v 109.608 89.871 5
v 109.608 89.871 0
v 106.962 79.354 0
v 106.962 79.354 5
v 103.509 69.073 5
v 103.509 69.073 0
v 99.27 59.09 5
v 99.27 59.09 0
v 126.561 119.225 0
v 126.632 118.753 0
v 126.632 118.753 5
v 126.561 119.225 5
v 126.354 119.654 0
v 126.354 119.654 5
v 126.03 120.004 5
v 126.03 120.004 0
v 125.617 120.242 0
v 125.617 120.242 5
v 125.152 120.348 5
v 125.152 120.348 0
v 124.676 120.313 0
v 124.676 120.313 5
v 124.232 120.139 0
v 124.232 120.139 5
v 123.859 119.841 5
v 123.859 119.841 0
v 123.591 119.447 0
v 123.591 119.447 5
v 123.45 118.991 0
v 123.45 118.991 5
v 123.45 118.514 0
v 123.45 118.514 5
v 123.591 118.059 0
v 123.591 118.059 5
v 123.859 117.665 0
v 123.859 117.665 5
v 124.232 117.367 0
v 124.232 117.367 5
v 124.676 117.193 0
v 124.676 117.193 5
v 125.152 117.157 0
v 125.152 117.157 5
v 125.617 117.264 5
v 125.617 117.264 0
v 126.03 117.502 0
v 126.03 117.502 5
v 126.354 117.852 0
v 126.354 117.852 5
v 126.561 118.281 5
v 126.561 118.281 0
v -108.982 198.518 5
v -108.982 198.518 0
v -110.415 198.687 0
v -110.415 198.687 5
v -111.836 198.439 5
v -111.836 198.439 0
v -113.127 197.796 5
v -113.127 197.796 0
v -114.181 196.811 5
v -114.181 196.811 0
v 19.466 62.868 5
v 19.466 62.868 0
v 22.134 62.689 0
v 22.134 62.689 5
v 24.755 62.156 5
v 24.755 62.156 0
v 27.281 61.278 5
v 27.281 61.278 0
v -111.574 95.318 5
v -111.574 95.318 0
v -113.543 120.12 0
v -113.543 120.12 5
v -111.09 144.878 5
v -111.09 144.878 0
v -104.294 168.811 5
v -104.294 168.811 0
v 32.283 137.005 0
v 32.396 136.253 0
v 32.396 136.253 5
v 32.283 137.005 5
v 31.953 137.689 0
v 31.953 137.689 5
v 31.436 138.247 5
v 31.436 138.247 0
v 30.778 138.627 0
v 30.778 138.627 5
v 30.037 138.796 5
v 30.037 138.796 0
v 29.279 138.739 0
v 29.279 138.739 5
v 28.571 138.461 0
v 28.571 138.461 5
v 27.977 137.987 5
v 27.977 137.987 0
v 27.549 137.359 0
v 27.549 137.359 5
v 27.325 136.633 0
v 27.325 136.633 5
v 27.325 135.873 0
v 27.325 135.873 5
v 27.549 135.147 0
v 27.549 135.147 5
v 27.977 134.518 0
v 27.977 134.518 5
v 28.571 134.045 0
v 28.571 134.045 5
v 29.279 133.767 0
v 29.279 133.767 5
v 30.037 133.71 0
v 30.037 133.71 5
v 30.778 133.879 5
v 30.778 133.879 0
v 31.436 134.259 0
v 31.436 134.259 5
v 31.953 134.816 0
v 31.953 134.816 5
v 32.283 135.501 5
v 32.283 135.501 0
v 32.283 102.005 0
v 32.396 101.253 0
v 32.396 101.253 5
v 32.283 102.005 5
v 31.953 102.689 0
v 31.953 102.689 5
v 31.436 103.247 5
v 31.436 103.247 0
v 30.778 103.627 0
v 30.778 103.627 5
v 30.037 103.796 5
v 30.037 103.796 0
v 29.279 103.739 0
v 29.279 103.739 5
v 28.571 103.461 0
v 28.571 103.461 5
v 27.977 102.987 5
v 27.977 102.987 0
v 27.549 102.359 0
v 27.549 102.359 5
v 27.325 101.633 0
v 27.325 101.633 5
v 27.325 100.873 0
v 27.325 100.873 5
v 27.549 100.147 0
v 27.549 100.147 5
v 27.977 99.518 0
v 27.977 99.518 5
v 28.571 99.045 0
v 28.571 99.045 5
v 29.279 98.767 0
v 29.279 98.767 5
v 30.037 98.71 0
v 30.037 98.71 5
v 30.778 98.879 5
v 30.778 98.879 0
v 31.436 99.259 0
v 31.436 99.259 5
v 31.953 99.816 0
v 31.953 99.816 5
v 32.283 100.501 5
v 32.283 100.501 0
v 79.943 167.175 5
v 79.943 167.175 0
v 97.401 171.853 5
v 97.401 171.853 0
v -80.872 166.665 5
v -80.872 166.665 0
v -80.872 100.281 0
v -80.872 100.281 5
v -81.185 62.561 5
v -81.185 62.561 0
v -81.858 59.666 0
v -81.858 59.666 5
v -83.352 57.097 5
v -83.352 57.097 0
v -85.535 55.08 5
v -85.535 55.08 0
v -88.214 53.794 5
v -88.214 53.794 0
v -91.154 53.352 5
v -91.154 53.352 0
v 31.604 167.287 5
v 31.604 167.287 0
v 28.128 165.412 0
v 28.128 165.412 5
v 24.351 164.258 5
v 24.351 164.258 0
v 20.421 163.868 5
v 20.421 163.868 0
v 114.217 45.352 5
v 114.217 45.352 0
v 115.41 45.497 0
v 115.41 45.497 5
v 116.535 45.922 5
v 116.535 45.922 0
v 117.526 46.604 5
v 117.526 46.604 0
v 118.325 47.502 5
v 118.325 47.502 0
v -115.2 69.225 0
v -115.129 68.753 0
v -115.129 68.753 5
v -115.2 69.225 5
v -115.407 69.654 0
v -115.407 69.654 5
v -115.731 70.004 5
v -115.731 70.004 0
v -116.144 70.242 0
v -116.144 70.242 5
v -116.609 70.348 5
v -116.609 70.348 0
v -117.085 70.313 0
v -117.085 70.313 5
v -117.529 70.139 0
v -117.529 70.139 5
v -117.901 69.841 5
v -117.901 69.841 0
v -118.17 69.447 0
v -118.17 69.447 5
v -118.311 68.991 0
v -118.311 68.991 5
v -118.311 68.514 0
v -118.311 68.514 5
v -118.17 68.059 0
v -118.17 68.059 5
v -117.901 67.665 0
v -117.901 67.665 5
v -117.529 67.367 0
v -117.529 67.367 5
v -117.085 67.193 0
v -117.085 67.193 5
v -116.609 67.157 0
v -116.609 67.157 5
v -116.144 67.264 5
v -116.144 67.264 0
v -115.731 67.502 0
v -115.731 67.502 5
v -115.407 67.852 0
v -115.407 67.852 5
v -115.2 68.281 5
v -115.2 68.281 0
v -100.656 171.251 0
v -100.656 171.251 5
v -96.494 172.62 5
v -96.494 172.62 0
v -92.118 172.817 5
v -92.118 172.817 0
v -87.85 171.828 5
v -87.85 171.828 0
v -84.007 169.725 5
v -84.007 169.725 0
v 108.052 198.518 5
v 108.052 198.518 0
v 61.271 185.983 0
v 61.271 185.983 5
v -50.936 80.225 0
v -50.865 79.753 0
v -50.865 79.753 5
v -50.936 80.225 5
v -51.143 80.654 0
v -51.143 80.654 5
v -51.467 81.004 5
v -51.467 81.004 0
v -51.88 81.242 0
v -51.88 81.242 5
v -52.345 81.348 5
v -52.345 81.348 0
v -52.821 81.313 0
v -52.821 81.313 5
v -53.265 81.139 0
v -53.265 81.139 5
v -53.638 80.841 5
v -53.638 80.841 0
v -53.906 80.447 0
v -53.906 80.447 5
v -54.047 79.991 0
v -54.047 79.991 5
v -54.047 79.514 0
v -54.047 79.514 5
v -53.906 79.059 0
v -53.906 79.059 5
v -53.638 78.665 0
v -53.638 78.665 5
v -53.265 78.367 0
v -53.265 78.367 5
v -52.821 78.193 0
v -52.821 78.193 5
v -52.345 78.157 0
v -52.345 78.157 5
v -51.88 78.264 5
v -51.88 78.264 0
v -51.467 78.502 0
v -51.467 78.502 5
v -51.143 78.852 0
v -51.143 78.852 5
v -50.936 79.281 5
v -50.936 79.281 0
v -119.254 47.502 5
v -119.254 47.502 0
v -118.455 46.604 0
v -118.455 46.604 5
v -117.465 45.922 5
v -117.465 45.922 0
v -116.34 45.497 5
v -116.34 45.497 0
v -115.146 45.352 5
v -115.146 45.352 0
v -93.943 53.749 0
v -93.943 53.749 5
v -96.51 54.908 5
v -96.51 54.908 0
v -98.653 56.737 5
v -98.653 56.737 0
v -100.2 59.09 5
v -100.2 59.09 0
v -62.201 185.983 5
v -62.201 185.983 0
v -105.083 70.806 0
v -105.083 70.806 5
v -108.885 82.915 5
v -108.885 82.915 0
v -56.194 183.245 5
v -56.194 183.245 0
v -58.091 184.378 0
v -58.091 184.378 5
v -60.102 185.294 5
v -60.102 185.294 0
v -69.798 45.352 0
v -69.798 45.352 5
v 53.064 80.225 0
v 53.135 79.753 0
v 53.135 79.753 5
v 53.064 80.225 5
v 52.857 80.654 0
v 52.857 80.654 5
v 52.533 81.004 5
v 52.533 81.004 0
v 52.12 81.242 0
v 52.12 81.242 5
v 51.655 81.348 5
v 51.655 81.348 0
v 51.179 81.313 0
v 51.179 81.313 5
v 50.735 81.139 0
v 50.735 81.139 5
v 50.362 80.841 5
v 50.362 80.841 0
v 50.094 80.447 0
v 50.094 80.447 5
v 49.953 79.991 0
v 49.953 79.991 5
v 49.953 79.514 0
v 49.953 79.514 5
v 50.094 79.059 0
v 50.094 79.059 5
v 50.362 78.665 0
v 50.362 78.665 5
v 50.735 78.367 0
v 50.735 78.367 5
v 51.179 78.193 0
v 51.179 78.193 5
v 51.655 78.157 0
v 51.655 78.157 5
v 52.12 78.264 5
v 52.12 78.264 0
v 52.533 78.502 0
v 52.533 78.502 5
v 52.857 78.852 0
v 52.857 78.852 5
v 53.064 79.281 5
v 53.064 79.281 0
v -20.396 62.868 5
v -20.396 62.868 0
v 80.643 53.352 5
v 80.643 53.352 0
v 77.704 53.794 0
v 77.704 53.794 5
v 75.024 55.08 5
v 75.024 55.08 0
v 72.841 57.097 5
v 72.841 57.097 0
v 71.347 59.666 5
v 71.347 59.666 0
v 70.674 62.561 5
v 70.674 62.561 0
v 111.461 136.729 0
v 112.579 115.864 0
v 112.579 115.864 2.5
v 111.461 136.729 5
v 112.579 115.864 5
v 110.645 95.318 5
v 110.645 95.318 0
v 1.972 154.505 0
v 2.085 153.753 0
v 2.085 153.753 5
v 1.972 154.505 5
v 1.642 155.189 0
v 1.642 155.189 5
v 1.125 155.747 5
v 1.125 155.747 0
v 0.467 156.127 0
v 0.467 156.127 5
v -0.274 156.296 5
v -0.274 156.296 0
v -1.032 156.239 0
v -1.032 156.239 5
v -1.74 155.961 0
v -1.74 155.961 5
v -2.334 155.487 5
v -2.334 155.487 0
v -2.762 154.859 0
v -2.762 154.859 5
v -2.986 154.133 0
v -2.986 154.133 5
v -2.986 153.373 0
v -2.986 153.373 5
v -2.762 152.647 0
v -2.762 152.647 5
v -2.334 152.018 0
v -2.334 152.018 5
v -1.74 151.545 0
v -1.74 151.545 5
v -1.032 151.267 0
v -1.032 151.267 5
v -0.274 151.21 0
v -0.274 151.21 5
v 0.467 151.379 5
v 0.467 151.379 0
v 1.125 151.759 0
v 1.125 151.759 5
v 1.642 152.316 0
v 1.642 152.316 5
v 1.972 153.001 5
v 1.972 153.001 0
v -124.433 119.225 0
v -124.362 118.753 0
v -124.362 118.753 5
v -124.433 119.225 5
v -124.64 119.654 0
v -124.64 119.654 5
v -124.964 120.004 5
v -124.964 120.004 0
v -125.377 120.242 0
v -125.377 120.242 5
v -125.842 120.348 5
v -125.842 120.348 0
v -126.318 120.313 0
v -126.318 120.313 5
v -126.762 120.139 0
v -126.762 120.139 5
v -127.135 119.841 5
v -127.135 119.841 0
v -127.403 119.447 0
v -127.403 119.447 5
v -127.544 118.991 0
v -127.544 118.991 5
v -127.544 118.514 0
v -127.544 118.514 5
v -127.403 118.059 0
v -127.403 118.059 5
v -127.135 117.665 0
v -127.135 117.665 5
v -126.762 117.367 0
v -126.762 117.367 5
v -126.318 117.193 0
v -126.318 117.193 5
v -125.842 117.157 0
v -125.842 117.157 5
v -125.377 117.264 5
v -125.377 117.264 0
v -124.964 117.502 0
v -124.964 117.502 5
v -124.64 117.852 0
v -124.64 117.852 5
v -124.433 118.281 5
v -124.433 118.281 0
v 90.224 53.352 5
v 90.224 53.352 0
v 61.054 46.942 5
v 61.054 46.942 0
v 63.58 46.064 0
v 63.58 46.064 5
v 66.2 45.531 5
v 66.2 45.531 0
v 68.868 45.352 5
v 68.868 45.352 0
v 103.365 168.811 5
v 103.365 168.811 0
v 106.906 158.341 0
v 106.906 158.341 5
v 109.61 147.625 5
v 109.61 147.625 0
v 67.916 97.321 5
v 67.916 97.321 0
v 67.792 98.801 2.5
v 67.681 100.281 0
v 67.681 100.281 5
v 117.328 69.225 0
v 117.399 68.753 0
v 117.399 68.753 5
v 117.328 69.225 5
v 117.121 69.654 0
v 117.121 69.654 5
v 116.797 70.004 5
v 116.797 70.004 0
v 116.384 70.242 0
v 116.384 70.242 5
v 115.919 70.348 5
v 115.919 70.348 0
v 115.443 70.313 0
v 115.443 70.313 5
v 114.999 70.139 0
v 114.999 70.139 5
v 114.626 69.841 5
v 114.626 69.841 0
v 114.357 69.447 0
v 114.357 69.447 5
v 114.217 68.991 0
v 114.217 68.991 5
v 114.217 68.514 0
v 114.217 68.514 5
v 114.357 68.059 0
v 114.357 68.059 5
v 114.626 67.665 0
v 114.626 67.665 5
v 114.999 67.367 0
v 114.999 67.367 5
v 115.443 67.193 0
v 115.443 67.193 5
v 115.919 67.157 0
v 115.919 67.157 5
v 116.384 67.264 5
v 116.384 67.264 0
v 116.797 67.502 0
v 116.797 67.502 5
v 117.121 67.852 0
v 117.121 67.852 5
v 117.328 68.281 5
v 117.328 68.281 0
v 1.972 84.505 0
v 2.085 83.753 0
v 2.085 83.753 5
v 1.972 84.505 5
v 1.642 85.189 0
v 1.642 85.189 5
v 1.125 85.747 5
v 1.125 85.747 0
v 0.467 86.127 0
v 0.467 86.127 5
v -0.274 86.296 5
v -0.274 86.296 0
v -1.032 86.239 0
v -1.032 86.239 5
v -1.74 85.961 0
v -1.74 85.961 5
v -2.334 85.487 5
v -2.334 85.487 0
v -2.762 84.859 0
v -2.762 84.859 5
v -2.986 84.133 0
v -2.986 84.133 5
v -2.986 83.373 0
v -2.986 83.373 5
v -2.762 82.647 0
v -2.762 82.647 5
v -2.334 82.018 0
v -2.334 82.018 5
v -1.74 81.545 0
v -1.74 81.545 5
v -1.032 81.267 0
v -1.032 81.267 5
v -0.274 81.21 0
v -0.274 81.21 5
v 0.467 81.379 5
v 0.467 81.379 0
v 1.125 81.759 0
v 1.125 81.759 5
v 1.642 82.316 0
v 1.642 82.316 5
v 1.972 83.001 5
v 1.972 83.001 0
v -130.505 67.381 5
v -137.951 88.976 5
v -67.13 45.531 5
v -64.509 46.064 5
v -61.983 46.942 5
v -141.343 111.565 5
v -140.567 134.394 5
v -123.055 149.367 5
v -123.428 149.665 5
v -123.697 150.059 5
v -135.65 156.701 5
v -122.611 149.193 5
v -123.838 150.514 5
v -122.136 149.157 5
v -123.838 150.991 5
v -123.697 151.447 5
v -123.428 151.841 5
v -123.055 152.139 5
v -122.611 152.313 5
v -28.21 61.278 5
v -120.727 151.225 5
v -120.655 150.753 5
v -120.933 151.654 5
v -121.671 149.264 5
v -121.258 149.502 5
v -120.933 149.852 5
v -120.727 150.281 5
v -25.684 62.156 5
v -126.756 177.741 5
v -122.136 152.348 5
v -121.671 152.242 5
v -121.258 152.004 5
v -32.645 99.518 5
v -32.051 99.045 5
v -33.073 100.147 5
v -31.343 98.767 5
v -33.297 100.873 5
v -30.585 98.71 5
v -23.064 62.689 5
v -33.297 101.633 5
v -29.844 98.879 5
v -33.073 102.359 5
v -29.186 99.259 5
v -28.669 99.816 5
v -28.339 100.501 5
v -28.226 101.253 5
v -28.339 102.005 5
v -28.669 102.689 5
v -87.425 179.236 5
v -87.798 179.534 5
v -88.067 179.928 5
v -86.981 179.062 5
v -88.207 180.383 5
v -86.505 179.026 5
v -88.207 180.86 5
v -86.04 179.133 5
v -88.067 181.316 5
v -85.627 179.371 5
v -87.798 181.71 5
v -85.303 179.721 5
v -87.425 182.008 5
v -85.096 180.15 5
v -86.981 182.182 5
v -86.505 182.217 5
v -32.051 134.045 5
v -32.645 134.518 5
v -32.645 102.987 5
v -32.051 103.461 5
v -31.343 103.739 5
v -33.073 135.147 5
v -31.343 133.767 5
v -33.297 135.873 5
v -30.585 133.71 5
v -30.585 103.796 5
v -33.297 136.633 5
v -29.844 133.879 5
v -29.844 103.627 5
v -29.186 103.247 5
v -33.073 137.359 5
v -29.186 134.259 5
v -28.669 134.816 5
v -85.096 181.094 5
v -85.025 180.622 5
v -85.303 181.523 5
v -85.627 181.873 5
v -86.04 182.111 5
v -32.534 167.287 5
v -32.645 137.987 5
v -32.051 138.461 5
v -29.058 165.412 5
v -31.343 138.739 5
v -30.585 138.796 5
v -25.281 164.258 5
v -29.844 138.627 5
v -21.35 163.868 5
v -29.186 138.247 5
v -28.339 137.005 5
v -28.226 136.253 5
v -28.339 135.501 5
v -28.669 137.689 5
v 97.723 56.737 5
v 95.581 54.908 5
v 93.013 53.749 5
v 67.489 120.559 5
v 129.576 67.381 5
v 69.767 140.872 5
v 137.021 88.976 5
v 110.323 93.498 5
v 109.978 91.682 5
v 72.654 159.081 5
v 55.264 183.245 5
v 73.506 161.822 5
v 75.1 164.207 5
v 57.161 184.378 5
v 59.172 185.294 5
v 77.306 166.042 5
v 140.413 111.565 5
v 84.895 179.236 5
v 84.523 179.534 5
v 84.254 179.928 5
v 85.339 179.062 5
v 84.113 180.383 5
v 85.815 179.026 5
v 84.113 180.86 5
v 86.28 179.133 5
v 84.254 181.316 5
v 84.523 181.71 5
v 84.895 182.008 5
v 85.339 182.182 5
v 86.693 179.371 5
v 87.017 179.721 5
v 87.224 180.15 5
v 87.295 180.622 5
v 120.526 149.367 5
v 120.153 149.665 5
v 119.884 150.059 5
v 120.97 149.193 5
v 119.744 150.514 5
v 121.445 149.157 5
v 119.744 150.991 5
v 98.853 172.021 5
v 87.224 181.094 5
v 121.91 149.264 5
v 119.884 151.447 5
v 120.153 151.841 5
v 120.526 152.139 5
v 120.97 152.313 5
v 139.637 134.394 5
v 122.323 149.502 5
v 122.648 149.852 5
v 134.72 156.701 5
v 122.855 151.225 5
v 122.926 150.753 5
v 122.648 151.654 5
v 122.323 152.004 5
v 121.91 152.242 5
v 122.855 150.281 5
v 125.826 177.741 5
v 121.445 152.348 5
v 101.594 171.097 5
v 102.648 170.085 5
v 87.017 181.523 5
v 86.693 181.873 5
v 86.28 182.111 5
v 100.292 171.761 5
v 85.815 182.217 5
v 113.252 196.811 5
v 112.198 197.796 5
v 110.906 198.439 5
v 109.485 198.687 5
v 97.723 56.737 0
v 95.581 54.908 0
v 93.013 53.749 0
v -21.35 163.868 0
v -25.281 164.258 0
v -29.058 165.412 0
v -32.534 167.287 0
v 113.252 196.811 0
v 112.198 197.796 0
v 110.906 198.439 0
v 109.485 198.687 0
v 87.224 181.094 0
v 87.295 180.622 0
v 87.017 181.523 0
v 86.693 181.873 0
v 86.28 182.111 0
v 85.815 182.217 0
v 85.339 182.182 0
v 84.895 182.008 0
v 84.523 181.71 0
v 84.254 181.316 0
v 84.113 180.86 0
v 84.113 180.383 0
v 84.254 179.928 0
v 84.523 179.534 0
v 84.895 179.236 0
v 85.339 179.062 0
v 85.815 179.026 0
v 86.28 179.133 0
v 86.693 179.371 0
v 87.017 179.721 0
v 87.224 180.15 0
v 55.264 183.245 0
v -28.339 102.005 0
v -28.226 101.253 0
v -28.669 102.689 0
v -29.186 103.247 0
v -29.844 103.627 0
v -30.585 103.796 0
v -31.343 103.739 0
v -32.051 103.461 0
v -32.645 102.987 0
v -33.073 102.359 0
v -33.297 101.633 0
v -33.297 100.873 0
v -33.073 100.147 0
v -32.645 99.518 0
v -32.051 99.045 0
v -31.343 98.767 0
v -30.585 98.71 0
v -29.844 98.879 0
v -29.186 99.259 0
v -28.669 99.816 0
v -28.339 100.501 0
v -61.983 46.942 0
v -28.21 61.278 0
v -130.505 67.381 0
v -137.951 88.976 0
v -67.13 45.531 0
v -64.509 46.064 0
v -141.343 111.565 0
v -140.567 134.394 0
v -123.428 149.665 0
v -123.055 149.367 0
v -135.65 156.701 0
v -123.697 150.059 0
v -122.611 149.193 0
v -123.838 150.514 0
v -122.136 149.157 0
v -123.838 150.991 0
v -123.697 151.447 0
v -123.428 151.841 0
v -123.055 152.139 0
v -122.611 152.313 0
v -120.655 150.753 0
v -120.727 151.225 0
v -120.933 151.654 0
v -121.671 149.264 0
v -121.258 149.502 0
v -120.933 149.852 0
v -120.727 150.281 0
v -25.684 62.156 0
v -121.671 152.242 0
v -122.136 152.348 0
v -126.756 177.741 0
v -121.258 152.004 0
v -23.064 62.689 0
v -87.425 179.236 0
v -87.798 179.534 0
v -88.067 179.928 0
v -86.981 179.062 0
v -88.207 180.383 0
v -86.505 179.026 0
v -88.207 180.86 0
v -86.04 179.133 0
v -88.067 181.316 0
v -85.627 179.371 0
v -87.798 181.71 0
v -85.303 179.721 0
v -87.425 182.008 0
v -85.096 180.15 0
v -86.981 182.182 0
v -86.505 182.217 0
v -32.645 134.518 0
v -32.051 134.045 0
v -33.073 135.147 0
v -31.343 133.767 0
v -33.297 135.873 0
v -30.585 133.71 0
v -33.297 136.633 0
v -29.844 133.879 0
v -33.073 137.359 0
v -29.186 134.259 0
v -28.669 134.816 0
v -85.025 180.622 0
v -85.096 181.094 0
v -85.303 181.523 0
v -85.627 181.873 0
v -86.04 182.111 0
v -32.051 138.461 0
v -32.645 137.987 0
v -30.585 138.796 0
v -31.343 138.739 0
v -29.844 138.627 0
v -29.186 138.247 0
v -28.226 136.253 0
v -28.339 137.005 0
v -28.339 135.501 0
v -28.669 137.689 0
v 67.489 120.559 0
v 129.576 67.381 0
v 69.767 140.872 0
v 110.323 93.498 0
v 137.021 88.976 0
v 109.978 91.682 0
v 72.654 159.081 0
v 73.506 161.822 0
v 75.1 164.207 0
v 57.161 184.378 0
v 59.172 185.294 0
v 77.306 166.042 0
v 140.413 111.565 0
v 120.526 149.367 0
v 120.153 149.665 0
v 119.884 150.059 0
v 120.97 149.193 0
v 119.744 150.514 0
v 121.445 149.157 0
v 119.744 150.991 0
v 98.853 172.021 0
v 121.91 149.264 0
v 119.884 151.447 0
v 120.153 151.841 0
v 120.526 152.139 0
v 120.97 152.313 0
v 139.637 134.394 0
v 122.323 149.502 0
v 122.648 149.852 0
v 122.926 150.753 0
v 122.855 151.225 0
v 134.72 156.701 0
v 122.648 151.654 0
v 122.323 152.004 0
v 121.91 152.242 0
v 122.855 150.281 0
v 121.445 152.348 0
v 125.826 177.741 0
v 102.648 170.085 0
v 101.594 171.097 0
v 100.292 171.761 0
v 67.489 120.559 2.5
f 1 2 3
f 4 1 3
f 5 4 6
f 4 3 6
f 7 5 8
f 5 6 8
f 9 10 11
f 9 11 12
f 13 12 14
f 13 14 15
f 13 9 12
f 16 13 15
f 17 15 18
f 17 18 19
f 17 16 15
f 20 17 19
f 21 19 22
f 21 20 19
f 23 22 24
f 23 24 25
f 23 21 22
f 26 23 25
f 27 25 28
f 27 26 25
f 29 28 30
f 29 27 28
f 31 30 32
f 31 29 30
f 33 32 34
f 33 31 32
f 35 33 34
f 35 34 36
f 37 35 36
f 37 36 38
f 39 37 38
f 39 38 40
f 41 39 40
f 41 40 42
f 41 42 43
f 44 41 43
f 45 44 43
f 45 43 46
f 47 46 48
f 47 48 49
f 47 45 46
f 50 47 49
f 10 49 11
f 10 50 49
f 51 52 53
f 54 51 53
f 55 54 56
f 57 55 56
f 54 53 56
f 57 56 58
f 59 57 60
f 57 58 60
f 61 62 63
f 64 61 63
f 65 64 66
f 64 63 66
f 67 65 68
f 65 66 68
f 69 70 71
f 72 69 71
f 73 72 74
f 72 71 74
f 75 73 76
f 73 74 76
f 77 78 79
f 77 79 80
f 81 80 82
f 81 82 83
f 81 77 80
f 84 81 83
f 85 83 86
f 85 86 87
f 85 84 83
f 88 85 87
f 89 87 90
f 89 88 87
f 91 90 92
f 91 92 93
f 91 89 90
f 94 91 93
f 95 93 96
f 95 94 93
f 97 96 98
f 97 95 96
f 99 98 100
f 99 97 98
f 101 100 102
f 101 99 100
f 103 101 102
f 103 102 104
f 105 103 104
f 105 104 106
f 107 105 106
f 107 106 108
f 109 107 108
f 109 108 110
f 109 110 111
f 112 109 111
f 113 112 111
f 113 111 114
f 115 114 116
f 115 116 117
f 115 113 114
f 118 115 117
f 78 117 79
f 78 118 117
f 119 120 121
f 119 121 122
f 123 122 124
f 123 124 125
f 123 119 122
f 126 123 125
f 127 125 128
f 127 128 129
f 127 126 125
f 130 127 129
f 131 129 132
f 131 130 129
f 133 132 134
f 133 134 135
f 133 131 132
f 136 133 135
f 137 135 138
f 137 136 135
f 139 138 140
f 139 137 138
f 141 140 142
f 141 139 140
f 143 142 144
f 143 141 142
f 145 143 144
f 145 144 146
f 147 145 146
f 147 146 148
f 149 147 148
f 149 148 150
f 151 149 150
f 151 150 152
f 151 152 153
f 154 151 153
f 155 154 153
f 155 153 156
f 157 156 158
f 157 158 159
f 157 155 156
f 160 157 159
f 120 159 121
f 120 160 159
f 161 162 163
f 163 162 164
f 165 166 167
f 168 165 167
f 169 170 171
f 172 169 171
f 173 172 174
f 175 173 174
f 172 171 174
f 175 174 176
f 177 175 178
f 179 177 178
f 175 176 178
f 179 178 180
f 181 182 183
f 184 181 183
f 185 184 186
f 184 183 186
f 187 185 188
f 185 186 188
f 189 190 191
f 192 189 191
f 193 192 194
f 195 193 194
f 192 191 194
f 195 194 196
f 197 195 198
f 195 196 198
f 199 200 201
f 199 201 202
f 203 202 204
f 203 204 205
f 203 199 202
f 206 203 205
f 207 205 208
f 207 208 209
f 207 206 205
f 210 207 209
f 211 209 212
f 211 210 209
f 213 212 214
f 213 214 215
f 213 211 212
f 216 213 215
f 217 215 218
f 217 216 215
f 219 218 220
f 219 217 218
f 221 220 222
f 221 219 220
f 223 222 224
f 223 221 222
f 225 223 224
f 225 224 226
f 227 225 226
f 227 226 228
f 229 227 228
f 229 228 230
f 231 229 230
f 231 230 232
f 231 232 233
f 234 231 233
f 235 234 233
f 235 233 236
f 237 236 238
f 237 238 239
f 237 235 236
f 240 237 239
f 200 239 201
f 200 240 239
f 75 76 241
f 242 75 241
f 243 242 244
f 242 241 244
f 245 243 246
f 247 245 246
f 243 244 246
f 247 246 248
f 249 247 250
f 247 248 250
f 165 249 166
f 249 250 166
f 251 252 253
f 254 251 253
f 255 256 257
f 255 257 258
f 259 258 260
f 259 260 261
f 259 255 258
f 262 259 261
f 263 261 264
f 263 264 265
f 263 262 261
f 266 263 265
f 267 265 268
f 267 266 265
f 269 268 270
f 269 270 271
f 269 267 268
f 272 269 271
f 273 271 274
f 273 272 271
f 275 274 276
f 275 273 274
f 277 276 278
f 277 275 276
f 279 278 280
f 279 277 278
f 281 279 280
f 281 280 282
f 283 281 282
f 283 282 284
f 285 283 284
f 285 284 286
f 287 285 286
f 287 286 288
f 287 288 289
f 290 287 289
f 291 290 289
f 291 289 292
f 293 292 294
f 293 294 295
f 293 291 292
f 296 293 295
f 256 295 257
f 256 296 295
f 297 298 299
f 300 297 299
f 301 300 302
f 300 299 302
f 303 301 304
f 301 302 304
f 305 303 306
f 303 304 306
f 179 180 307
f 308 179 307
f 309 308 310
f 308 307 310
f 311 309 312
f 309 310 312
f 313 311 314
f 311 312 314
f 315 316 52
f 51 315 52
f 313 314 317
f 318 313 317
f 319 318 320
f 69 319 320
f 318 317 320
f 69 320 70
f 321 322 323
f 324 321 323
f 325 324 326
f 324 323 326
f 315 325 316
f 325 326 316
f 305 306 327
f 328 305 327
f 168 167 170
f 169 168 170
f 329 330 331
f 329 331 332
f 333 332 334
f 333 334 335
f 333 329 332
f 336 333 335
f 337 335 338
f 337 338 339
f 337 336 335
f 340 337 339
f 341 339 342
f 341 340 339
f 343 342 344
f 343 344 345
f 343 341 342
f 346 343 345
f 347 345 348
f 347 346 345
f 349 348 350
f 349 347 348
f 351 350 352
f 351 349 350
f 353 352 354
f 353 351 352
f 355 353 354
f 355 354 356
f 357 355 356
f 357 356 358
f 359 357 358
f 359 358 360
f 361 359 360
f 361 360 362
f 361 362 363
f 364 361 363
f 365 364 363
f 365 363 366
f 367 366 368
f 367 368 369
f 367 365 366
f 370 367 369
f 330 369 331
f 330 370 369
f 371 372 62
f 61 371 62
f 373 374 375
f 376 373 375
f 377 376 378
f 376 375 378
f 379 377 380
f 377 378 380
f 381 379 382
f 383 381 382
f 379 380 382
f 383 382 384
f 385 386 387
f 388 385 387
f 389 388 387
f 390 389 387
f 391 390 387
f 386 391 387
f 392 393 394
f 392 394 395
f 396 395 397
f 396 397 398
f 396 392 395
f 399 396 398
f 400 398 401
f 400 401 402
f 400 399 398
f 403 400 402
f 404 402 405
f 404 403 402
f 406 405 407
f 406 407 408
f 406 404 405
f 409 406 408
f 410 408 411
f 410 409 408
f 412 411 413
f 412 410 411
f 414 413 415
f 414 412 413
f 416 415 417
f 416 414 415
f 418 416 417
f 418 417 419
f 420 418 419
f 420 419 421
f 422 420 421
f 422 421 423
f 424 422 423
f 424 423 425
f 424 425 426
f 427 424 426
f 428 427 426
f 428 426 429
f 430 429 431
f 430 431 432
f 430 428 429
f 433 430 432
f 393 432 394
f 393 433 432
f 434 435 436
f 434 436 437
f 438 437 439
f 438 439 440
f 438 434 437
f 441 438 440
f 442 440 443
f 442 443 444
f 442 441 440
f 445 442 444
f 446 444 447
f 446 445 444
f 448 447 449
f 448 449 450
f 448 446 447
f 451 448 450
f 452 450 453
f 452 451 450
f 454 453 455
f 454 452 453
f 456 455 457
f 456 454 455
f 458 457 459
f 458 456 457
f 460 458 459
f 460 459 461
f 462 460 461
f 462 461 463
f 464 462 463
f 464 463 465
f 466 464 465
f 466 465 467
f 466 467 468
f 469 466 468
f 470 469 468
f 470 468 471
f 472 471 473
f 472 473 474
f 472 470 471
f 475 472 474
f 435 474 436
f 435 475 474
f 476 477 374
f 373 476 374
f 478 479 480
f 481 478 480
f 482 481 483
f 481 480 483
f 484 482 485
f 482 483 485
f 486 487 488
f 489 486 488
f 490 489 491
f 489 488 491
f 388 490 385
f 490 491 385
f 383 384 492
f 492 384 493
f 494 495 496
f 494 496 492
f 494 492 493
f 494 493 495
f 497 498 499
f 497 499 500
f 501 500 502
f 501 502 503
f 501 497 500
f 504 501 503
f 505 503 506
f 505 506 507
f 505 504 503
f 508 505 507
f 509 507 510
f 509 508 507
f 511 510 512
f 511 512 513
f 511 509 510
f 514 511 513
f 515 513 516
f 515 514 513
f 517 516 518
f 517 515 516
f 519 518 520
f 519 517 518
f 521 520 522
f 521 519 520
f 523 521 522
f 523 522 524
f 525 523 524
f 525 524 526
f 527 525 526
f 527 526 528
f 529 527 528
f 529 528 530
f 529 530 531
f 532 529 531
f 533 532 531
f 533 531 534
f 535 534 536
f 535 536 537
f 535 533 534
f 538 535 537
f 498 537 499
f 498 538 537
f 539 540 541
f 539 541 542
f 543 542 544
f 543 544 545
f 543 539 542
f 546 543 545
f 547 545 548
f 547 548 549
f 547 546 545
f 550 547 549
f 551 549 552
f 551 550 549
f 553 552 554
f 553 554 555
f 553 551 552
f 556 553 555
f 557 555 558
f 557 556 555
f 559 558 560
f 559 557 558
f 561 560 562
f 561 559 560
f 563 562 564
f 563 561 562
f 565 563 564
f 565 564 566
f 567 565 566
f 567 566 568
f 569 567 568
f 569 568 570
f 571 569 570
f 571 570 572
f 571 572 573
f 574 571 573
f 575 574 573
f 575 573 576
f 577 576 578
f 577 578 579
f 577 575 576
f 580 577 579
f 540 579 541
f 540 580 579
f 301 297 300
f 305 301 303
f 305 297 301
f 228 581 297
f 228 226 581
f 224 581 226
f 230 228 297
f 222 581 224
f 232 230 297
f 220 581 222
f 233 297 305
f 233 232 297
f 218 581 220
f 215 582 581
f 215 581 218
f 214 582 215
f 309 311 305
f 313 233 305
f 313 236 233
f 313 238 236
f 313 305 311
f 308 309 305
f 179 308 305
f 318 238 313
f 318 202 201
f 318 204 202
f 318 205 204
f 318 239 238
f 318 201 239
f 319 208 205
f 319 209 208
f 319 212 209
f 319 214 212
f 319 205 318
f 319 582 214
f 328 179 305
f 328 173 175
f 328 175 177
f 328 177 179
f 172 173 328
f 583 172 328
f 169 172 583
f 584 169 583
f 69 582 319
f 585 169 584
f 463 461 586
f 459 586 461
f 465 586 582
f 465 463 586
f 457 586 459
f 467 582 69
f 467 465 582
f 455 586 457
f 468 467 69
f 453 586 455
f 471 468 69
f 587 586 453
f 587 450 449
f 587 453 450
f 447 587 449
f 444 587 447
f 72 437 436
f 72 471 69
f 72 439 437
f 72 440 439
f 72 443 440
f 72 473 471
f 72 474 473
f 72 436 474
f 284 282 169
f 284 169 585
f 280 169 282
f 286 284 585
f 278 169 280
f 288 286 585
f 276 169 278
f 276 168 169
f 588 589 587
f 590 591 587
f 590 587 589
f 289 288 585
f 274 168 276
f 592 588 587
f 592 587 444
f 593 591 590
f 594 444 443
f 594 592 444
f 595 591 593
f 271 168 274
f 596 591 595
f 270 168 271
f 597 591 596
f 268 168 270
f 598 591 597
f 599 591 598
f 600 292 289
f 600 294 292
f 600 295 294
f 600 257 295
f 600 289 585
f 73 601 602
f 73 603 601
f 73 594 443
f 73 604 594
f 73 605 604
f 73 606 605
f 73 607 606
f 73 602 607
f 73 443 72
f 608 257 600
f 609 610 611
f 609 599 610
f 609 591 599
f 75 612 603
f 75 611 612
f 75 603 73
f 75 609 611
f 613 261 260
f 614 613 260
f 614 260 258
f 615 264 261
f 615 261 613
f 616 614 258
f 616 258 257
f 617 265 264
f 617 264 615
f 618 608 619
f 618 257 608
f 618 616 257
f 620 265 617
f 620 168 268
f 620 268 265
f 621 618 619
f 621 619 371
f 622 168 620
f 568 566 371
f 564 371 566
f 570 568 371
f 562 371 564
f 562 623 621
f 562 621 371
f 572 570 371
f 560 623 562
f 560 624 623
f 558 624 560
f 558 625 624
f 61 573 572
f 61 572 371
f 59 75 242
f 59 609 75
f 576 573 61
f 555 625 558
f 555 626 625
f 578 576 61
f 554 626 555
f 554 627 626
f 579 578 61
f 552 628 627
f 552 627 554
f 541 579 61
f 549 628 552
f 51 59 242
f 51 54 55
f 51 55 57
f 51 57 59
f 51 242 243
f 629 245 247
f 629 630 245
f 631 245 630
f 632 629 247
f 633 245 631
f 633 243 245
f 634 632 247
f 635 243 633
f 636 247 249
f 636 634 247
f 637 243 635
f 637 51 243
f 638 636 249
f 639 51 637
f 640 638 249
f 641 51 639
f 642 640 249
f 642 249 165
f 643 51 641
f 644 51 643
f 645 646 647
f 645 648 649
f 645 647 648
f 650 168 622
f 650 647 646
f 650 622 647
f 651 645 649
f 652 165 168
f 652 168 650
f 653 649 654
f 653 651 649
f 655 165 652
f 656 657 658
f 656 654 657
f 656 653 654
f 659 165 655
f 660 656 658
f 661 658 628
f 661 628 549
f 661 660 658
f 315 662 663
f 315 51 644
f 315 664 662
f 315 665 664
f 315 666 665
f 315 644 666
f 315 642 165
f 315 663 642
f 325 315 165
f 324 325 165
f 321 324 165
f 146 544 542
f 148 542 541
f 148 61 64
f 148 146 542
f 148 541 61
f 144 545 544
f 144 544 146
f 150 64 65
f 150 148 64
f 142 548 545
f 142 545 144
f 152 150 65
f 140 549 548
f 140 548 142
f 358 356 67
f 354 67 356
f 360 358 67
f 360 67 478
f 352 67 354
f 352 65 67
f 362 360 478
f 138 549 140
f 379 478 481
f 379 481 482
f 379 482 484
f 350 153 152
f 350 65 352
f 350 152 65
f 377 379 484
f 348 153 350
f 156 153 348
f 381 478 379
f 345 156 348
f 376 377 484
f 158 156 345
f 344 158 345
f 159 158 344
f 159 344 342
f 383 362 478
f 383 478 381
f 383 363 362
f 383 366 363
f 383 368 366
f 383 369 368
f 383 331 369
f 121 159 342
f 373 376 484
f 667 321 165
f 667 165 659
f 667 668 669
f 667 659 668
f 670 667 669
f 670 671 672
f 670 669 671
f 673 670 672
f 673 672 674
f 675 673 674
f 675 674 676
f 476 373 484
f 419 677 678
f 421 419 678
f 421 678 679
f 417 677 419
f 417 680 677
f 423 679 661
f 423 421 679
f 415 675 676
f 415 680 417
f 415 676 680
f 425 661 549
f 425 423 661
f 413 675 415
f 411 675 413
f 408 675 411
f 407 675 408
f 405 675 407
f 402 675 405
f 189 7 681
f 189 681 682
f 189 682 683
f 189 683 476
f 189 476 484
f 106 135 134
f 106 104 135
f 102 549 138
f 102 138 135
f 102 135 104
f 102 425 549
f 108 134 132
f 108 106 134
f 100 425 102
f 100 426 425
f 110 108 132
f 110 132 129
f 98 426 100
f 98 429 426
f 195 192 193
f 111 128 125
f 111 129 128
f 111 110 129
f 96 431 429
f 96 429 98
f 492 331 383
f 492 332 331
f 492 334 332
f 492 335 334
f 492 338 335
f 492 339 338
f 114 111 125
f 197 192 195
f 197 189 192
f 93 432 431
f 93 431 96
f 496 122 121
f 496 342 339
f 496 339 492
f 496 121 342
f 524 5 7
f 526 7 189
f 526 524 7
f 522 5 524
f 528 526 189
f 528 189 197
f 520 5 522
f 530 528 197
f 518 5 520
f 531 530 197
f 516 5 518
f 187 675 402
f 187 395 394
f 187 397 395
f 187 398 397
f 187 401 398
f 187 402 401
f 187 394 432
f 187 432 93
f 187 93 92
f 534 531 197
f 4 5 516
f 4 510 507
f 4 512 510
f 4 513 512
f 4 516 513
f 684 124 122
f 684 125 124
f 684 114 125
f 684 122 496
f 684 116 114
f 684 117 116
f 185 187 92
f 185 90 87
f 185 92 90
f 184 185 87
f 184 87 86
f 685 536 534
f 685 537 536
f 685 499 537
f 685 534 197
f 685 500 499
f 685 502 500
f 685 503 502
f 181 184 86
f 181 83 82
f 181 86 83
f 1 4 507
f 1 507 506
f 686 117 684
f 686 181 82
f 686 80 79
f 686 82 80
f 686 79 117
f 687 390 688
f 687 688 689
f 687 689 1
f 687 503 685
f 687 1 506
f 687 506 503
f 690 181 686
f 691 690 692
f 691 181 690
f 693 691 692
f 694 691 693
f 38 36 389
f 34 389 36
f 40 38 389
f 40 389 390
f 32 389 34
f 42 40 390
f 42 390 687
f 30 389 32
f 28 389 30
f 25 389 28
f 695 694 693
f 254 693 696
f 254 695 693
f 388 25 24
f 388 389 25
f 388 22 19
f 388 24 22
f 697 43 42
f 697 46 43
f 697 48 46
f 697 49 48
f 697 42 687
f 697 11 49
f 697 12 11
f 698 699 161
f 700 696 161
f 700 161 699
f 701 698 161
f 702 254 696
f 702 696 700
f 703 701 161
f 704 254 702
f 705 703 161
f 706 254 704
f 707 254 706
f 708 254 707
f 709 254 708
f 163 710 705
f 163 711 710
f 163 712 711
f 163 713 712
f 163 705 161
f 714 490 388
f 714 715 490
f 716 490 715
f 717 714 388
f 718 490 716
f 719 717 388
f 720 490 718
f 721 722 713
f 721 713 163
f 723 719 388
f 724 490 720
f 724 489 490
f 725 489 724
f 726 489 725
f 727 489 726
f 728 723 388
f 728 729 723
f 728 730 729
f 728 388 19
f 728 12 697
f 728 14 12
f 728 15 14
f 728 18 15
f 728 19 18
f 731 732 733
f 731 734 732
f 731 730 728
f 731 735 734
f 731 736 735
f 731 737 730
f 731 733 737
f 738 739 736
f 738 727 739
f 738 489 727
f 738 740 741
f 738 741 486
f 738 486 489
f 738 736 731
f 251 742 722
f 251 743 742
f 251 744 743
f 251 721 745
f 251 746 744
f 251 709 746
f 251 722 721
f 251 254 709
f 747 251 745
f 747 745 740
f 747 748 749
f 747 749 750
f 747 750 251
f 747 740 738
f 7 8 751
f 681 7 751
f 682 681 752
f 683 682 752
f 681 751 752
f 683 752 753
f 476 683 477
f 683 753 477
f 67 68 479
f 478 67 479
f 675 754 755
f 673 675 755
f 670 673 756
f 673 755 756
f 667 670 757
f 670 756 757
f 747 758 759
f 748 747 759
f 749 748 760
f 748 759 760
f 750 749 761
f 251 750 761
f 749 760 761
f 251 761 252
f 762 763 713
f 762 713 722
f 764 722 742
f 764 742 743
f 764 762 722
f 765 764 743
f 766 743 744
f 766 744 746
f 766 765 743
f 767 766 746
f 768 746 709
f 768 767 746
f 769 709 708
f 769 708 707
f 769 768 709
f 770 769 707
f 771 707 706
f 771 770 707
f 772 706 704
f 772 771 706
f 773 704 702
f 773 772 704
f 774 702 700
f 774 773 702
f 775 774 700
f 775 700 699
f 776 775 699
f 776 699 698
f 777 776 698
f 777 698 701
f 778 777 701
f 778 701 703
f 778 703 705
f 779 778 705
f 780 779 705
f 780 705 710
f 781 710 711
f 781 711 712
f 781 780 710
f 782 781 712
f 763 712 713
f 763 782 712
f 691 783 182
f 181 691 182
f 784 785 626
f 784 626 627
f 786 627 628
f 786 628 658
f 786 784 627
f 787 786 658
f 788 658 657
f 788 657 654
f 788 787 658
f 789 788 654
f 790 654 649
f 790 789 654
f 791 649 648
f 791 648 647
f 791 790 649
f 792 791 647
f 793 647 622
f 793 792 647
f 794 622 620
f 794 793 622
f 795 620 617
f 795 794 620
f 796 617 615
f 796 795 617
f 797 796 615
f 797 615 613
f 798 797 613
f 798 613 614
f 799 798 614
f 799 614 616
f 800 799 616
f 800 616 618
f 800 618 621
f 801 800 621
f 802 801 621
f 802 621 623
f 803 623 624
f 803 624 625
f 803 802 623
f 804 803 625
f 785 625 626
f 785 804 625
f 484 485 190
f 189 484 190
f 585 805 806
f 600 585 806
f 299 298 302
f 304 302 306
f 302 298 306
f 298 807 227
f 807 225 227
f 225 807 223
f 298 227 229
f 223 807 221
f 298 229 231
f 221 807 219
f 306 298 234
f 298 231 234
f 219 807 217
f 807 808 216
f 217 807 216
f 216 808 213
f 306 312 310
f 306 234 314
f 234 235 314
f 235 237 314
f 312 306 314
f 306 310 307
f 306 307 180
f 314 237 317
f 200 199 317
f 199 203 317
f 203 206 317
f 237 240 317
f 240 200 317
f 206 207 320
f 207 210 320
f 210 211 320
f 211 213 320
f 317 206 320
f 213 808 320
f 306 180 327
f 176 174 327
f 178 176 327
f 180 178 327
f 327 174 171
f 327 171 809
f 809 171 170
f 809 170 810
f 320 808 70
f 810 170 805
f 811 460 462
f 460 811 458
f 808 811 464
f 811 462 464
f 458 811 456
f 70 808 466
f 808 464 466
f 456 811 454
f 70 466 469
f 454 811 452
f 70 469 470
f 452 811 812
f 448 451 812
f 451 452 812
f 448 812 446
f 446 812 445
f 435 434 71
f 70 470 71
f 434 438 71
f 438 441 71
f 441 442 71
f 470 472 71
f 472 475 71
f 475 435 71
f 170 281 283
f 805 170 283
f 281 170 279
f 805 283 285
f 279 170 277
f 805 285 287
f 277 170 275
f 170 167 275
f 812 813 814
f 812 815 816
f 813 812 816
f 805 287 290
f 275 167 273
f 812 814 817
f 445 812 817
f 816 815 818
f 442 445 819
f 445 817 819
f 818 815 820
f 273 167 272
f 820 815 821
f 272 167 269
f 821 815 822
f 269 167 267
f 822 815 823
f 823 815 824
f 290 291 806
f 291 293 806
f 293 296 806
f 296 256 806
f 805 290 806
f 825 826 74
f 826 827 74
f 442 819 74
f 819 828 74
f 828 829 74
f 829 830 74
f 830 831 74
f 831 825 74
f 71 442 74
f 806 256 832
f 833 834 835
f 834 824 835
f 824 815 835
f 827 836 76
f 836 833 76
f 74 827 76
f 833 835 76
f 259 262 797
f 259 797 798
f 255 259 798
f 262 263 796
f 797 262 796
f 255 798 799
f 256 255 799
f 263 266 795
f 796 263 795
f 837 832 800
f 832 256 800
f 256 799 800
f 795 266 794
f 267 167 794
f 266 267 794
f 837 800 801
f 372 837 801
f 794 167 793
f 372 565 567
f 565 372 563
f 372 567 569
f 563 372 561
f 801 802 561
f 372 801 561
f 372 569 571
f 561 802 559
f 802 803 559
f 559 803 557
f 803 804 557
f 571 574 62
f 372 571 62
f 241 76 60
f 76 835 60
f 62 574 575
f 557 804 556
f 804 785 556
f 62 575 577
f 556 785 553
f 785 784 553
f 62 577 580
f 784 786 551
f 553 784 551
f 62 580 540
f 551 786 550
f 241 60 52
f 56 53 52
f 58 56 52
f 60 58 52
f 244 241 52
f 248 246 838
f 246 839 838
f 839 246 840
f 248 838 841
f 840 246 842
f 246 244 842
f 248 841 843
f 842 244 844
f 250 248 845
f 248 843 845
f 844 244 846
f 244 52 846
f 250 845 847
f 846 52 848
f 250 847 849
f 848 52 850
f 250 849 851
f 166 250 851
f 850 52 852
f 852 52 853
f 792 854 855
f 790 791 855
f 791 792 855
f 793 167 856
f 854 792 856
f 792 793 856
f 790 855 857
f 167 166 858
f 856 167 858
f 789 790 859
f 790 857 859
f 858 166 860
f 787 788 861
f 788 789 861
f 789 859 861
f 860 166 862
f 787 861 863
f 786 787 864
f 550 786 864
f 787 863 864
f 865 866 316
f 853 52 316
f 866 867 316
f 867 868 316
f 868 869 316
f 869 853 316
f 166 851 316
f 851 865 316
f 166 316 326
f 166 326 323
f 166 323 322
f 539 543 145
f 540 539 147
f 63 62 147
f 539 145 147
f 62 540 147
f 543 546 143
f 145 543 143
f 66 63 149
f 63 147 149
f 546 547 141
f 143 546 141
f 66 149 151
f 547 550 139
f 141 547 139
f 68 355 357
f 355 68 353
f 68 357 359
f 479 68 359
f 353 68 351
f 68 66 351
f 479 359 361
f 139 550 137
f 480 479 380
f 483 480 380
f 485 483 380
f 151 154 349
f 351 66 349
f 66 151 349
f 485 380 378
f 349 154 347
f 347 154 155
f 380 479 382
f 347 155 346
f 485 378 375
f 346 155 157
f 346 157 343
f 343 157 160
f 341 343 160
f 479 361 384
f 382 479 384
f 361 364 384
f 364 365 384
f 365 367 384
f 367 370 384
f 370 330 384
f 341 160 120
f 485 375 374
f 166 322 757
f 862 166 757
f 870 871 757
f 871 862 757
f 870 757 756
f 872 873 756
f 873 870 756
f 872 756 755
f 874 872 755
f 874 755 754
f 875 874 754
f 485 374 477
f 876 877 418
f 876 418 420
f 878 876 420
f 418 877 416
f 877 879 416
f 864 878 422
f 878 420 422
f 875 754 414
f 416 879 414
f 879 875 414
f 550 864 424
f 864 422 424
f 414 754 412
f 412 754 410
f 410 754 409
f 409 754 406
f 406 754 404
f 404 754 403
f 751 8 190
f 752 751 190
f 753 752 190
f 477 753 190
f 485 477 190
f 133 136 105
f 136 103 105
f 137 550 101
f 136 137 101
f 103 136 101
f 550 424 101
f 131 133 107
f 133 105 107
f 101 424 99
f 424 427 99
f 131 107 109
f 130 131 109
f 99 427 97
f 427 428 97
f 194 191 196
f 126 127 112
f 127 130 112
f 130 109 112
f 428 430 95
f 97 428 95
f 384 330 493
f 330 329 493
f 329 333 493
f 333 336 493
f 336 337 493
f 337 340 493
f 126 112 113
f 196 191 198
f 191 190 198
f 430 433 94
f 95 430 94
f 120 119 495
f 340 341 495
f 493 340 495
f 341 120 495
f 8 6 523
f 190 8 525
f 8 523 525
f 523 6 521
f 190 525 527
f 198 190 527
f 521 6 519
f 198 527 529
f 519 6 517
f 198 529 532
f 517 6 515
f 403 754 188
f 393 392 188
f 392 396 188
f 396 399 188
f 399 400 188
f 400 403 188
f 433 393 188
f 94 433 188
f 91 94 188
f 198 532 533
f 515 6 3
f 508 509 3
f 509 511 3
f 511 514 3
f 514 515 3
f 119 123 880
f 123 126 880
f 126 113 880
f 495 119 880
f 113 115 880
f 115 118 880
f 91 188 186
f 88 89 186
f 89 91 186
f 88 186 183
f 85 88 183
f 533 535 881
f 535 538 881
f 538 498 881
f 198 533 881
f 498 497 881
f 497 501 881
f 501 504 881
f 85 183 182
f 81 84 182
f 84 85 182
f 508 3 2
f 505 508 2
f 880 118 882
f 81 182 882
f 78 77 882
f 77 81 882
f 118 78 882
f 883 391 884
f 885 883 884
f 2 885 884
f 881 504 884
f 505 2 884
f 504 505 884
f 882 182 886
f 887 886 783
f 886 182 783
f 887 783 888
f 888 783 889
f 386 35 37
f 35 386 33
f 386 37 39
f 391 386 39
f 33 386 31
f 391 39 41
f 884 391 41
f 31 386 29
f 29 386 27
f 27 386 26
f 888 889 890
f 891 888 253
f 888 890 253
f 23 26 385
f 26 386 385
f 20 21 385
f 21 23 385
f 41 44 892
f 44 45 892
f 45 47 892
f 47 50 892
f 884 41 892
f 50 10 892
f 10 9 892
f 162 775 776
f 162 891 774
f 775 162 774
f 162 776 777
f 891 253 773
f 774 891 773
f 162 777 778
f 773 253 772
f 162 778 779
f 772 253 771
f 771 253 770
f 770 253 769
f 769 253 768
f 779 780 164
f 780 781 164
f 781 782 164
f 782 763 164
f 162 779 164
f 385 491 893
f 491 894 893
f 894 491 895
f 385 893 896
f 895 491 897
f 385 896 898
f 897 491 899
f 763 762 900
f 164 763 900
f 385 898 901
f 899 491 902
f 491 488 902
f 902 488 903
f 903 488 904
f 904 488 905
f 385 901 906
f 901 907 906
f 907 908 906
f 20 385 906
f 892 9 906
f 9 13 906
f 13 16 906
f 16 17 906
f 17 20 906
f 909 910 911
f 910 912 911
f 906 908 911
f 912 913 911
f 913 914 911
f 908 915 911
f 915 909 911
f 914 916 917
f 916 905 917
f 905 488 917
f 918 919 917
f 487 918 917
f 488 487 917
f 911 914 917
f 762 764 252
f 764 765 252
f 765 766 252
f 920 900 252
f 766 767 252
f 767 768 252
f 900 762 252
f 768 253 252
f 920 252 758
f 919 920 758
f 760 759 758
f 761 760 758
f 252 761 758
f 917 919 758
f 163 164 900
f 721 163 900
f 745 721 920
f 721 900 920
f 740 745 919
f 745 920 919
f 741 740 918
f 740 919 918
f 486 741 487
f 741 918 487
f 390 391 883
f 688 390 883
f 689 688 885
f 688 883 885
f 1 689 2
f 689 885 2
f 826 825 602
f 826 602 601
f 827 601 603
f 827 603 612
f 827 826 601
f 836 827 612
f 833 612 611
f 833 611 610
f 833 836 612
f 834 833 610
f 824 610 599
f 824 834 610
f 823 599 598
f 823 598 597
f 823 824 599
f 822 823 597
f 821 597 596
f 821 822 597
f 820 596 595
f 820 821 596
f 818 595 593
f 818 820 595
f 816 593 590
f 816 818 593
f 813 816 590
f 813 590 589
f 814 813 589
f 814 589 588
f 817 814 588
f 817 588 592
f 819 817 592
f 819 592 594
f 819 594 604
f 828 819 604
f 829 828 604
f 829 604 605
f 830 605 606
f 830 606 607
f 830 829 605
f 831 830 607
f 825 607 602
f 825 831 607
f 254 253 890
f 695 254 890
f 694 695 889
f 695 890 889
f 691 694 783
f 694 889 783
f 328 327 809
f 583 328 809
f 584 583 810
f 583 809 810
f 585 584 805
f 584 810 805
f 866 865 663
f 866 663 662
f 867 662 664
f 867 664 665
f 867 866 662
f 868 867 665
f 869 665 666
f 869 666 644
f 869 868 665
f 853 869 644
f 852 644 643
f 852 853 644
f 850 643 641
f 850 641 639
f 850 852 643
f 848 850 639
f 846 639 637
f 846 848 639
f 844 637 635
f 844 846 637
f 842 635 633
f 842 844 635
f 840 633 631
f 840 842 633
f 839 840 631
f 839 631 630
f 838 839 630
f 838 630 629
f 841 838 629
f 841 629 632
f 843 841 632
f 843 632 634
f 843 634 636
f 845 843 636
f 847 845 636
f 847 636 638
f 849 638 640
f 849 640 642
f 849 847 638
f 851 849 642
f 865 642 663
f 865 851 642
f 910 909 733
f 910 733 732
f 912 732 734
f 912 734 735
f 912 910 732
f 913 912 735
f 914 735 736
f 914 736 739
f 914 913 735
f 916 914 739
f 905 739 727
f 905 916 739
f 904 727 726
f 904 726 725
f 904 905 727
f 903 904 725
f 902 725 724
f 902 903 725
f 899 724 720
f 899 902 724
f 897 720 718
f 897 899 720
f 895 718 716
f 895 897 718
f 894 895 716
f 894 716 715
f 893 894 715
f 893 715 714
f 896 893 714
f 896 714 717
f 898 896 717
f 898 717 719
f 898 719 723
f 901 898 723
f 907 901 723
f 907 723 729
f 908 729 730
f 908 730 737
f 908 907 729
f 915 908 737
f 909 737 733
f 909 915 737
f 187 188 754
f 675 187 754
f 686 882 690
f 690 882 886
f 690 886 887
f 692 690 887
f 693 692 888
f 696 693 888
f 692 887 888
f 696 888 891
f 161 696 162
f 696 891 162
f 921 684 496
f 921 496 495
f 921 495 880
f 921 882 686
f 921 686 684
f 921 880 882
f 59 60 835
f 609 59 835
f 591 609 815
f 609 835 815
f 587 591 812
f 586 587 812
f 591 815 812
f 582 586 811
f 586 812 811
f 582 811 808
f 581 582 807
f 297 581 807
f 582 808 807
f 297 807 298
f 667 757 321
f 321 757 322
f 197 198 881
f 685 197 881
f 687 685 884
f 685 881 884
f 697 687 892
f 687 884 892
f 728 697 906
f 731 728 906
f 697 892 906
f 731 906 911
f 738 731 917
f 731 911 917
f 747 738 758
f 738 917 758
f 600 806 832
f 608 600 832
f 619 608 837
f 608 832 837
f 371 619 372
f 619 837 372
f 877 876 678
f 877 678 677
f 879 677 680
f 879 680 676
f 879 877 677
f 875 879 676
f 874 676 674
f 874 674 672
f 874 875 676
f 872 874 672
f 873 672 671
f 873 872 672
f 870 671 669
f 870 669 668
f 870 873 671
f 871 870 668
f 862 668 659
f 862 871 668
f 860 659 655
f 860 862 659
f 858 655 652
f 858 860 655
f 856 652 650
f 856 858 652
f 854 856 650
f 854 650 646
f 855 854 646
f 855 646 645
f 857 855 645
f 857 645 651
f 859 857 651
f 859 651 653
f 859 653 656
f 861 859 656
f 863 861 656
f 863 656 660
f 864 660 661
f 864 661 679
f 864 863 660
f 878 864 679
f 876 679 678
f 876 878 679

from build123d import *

# Parameters (mm, degrees)
SKETCH7_R           = 1.6
SKETCH7_R_2         = 2.55
BOSS_EXTRUDE2_DEPTH = 5


with BuildPart() as part:
    # Sketch7 → Boss-Extrude2 (new body)
    with BuildSketch(Plane(origin=(-155.165218795, 0, 0), x_dir=(1, 0, 0), z_dir=(0, 0, 1))):
        with BuildLine():
            ThreePointArc((186.769671741, 167.286880781), (181.433247766, 164.741537113), (175.585813672, 163.867632232))
            Line((175.585813672, 163.867632232), (133.81504093, 163.867632232))
            ThreePointArc((133.81504093, 163.867632232), (127.967606836, 164.741537113), (122.631182861, 167.286880781))
            Line((122.631182861, 167.286880781), (98.971665752, 183.245426575))
            ThreePointArc((98.971665752, 183.245426575), (96.081672536, 184.863900542), (92.964188585, 185.98319165))
            Line((92.964188585, 185.98319165), (46.183315852, 198.51808872))
            ThreePointArc((46.183315852, 198.51808872), (43.329318726, 198.438902311), (40.983947586, 196.81077323))
            ThreePointArc((40.983947586, 196.81077323), (13.687864292, 122.997631993), (35.910853464, 47.501971622))
            ThreePointArc((35.910853464, 47.501971622), (37.700666361, 45.921987917), (40.019050269, 45.352010045))
            Line((40.019050269, 45.352010045), (85.367161343, 45.352010045))
            ThreePointArc((85.367161343, 45.352010045), (89.354520031, 45.753515952), (93.181783913, 46.941912976))
            Line((93.181783913, 46.941912976), (126.95485072, 61.277729301))
            ThreePointArc((126.95485072, 61.277729301), (130.782114601, 62.466126325), (134.769473289, 62.867632232))
            Line((134.769473289, 62.867632232), (174.631381312, 62.867632232))
            ThreePointArc((174.631381312, 62.867632232), (178.618740001, 62.466126325), (182.446003882, 61.277729301))
            Line((182.446003882, 61.277729301), (216.219070689, 46.941912976))
            ThreePointArc((216.219070689, 46.941912976), (220.04633457, 45.753515952), (224.033693259, 45.352010045))
            Line((224.033693259, 45.352010045), (269.381804333, 45.352010045))
            ThreePointArc((269.381804333, 45.352010045), (271.70018824, 45.921987917), (273.490001138, 47.501971622))
            ThreePointArc((273.490001138, 47.501971622), (295.712990309, 122.997631993), (268.416907015, 196.81077323))
            ThreePointArc((268.416907015, 196.81077323), (266.071535876, 198.438902311), (263.217538749, 198.51808872))
            Line((263.217538749, 198.51808872), (216.436666017, 185.98319165))
            ThreePointArc((216.436666017, 185.98319165), (213.319182066, 184.863900542), (210.42918885, 183.245426575))
            Line((210.42918885, 183.245426575), (186.769671741, 167.286880781))
        make_face()
        with Locations((38.436607979, 68.752932179)):
            Circle(SKETCH7_R, mode=Mode.SUBTRACT)
        with Locations((102.700427301, 79.752932179)):
            Circle(SKETCH7_R, mode=Mode.SUBTRACT)
        with Locations((29.203576285, 118.752932179)):
            Circle(SKETCH7_R, mode=Mode.SUBTRACT)
        with BuildLine():
            ThreePointArc((50.870986739, 168.810905662), (63.047418465, 172.817129133), (74.292978733, 166.664675124))
            Line((74.292978733, 166.664675124), (74.292978733, 100.280747179))
            Line((74.292978733, 100.280747179), (73.980283138, 62.561010441))
            ThreePointArc((73.980283138, 62.561010441), (70.797263007, 56.006603452), (64.011616245, 53.352010045))
            ThreePointArc((64.011616245, 53.352010045), (58.655129241, 54.907600831), (54.965142603, 59.09040065))
            ThreePointArc((54.965142603, 59.09040065), (48.044160974, 76.816977425), (43.591061483, 95.318366989))
            ThreePointArc((43.591061483, 95.318366989), (42.297615396, 132.553323304), (50.870986739, 168.810905662))
        make_face(mode=Mode.SUBTRACT)
        with Locations((124.389538168, 101.252932179)):
            Circle(SKETCH7_R_2, mode=Mode.SUBTRACT)
        with Locations((206.700427301, 79.752932179)):
            Circle(SKETCH7_R, mode=Mode.SUBTRACT)
        with Locations((270.964246623, 68.752932179)):
            Circle(SKETCH7_R, mode=Mode.SUBTRACT)
        with Locations((154.700427301, 83.752932179)):
            Circle(SKETCH7_R_2, mode=Mode.SUBTRACT)
        with Locations((185.011316433, 101.252932179)):
            Circle(SKETCH7_R_2, mode=Mode.SUBTRACT)
        with BuildLine():
            Line((235.107875868, 167.174775102), (252.566315963, 171.852750026))
            ThreePointArc((252.566315963, 171.852750026), (256.132298182, 171.477167312), (258.529867862, 168.810905662))
            ThreePointArc((258.529867862, 168.810905662), (263.529184961, 153.009876594), (266.626244503, 136.728785929))
            add(Edge.make_bspline(
                [(266.626244503, 136.728785929), (269.27120455, 115.705359984), (265.809793118, 95.318366989)],
                knots=[0, 0, 0, 0.881934454, 0.881934454, 0.881934454], degree=2))
            ThreePointArc((265.809793118, 95.318366989), (265.318661666, 92.589710086), (264.773591938, 89.871313942))
            ThreePointArc((264.773591938, 89.871313942), (260.500059228, 74.180131562), (254.435711999, 59.09040065))
            ThreePointArc((254.435711999, 59.09040065), (250.745725361, 54.907600831), (245.389238357, 53.352010045))
            Line((245.389238357, 53.352010045), (235.807999121, 53.352010045))
            ThreePointArc((235.807999121, 53.352010045), (229.022352359, 56.006603452), (225.839332228, 62.561010441))
            Line((225.839332228, 62.561010441), (223.081153151, 97.32129138))
            add(Edge.make_bspline(
                [(222.846324523, 100.280747179), (222.950560925, 98.800835847), (223.081153151, 97.32129138)],
                knots=[0.931930938, 0.931930938, 0.931930938, 1, 1, 1], degree=2))
            add(Edge.make_bspline(
                [(224.932331274, 140.872333064), (221.419227915, 120.542156926), (222.846324523, 100.280747179)],
                knots=[0, 0, 0, 0.931930938, 0.931930938, 0.931930938], degree=2))
            Line((224.932331274, 140.872333064), (227.819439706, 159.081481956))
            ThreePointArc((227.819439706, 159.081481956), (230.265167007, 164.207432514), (235.107875868, 167.174775102))
        make_face(mode=Mode.SUBTRACT)
        with Locations((280.197278317, 118.752932179)):
            Circle(SKETCH7_R, mode=Mode.SUBTRACT)
        with Locations((32.909775986, 150.752932179)):
            Circle(SKETCH7_R, mode=Mode.SUBTRACT)
        with Locations((124.389538168, 136.252932179)):
            Circle(SKETCH7_R_2, mode=Mode.SUBTRACT)
        with Locations((68.540177705, 180.621909566)):
            Circle(SKETCH7_R, mode=Mode.SUBTRACT)
        with Locations((185.011316433, 136.252932179)):
            Circle(SKETCH7_R_2, mode=Mode.SUBTRACT)
        with Locations((154.700427301, 153.752932179)):
            Circle(SKETCH7_R_2, mode=Mode.SUBTRACT)
        with Locations((276.491078616, 150.752932179)):
            Circle(SKETCH7_R, mode=Mode.SUBTRACT)
        with Locations((240.860676897, 180.621909566)):
            Circle(SKETCH7_R, mode=Mode.SUBTRACT)
    extrude(amount=BOSS_EXTRUDE2_DEPTH)


solid = part.part
